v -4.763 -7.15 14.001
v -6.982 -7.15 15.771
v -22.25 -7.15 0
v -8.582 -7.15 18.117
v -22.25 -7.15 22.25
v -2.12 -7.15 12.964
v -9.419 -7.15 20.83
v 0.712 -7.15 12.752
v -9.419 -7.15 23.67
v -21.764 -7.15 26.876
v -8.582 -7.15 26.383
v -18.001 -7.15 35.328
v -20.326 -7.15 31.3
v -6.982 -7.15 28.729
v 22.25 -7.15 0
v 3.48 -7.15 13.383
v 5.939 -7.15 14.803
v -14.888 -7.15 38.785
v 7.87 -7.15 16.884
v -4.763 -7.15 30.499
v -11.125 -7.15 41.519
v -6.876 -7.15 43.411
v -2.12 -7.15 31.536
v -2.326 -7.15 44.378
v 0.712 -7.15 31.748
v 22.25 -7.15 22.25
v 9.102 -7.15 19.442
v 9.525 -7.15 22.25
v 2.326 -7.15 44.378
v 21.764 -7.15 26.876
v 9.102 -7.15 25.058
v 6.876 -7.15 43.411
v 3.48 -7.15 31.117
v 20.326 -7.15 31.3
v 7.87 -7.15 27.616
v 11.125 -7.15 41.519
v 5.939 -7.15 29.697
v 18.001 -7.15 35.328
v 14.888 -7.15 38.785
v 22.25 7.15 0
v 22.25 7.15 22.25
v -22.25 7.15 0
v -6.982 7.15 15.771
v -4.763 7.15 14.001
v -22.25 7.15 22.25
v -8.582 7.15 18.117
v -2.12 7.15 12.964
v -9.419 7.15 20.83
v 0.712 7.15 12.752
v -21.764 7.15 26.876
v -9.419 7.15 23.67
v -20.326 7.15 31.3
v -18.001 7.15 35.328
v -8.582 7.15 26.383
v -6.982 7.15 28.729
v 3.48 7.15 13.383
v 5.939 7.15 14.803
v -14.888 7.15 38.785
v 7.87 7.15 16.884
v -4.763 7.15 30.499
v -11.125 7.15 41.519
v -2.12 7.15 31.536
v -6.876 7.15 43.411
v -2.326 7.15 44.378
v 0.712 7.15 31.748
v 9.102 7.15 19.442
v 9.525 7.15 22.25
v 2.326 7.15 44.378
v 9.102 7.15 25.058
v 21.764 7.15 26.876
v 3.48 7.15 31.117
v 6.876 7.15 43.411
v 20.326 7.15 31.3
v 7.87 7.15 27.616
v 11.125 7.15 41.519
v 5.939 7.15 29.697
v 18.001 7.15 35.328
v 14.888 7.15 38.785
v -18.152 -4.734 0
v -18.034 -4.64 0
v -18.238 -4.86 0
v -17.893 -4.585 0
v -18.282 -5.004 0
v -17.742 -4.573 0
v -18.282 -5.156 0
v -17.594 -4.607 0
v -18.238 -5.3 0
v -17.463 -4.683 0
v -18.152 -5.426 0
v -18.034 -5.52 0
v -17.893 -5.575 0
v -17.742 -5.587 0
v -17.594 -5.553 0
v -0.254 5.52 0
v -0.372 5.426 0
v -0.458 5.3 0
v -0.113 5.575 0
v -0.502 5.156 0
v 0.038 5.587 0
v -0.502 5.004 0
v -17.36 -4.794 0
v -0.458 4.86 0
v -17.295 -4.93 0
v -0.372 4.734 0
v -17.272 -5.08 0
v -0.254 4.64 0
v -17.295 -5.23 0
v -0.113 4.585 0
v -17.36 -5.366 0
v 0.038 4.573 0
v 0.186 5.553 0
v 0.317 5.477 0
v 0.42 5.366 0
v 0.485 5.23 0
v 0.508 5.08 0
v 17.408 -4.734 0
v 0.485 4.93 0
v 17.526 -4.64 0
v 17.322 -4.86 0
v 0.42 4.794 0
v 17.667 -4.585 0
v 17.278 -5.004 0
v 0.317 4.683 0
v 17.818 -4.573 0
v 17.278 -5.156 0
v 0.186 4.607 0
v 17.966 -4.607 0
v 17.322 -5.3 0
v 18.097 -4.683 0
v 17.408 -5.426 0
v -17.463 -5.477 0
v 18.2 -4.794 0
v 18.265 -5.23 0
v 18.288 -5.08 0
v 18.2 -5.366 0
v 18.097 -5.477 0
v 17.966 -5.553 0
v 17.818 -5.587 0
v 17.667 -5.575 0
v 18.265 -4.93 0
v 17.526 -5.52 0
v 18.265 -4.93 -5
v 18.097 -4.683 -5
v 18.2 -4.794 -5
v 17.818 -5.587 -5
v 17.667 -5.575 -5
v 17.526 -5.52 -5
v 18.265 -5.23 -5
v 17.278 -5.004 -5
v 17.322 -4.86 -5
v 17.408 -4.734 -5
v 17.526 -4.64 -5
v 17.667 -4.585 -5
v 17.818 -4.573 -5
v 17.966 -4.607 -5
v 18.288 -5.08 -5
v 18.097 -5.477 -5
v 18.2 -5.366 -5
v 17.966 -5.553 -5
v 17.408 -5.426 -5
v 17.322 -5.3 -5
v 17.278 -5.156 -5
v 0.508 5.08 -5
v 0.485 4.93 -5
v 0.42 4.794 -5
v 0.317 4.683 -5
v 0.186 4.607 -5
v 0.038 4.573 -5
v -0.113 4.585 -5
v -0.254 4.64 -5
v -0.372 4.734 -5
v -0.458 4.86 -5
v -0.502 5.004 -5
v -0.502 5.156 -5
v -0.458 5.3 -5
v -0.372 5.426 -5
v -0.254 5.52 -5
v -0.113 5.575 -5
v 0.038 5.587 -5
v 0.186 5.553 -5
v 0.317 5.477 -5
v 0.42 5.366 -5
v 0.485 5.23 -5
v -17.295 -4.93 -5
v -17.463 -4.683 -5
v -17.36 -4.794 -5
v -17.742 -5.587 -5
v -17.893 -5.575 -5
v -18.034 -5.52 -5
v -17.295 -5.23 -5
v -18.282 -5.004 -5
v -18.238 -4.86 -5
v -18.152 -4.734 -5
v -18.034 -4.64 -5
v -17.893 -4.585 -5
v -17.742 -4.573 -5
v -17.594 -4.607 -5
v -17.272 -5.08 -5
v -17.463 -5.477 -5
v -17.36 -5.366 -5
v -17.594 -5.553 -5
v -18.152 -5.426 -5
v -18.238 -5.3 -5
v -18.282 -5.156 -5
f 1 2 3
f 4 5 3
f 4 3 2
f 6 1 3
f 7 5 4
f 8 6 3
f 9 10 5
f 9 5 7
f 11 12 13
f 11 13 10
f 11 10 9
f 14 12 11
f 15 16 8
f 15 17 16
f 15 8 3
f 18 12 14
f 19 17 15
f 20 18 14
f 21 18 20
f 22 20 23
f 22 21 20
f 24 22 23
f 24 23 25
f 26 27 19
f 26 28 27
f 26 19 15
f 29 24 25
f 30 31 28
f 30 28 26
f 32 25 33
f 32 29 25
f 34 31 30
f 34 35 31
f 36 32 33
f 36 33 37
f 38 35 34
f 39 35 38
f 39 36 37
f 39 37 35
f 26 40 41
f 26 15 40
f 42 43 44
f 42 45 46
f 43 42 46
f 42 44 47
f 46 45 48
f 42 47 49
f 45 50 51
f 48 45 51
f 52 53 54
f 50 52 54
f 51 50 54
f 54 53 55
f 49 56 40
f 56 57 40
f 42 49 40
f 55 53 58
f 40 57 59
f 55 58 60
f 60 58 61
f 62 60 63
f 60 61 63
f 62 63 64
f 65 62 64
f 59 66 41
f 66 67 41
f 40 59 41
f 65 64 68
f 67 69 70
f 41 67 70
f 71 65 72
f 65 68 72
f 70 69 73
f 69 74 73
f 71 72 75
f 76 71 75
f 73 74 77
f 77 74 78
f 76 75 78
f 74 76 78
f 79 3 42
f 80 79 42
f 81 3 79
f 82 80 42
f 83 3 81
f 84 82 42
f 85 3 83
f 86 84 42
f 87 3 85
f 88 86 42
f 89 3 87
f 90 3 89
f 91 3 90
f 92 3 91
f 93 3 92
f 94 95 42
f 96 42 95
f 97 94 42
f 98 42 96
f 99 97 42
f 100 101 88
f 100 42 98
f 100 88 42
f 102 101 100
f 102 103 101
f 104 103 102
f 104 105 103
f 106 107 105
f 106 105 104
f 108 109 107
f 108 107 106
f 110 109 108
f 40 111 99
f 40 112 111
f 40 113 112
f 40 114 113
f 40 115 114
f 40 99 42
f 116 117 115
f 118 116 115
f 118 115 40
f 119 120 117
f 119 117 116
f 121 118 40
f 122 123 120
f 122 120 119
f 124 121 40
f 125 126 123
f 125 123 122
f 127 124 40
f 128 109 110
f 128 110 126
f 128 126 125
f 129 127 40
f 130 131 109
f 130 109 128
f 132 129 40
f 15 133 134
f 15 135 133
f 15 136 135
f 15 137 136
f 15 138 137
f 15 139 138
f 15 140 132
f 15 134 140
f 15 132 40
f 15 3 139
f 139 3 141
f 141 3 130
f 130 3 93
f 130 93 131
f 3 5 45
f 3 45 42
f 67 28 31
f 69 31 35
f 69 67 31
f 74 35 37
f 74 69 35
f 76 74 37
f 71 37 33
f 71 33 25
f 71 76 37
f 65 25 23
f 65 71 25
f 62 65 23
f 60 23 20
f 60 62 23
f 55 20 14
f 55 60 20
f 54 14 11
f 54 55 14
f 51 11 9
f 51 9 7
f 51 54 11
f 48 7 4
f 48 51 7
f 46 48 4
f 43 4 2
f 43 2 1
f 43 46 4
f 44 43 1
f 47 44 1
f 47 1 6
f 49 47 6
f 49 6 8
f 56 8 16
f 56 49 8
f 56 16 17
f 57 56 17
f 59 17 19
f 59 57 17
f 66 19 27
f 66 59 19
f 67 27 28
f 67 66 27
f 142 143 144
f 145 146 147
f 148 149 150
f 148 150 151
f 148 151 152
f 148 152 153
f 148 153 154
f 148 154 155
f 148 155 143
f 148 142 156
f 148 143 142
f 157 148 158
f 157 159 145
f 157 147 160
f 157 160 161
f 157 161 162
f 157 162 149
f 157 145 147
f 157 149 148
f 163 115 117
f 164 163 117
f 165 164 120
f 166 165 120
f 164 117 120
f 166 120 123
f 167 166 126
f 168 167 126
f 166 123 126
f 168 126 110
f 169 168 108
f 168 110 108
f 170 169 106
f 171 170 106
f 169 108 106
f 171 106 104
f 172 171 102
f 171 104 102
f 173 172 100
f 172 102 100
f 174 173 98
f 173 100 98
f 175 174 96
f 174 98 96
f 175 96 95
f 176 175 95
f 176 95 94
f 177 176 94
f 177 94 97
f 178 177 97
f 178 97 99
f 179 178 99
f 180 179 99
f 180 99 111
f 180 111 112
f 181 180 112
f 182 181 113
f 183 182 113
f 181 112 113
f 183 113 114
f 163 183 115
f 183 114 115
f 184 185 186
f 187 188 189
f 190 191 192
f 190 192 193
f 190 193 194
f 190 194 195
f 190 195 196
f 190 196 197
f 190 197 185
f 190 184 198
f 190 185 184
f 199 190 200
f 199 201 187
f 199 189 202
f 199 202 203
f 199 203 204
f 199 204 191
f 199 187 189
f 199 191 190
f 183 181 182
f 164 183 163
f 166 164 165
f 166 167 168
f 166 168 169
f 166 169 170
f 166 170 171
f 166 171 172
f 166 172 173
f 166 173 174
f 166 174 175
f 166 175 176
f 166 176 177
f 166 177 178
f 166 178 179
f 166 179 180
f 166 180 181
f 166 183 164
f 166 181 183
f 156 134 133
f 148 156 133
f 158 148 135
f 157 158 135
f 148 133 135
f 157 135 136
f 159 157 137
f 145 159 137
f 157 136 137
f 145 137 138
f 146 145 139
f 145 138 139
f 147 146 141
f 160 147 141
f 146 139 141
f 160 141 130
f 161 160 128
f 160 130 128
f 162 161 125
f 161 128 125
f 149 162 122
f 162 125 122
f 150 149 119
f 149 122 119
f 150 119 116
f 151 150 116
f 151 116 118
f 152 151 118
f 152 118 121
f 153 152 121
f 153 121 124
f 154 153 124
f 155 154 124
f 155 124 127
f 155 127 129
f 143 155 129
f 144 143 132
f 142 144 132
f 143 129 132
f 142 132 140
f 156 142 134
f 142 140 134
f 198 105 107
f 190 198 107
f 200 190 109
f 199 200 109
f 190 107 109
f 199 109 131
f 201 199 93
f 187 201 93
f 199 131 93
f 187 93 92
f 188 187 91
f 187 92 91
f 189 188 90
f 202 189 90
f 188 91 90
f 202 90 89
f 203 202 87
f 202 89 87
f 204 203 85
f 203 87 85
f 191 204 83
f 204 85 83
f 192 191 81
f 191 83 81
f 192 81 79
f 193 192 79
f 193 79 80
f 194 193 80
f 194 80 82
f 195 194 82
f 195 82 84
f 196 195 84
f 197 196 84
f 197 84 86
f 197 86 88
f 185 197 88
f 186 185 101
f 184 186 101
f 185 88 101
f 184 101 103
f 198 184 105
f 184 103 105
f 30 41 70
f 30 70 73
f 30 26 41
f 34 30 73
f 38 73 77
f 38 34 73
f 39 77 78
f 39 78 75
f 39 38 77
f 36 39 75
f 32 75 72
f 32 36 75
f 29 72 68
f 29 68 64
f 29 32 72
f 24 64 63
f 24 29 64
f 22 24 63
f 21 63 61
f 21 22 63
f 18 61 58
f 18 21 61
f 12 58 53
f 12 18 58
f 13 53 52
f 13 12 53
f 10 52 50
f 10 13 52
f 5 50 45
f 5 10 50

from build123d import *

# Parameters (mm, degrees)
F0_R     = 9.525
F1_DEPTH = 7.15
F2_R     = 0.508
F3_DEPTH = 5


with BuildPart() as f1:
    # F0 (on Front) → F1 (new body, symmetric)
    with BuildSketch(Plane.XZ):
        with BuildLine():
            ThreePointArc((22.25, 22.25), (0, 44.5), (-22.25, 22.25))
            Line((-22.25, 22.25), (-22.25, 0))
            Line((-22.25, 0), (22.25, 0))
            Line((22.25, 0), (22.25, 22.25))
        make_face()
        with Locations((0, 22.25)):
            Circle(F0_R, mode=Mode.SUBTRACT)
    extrude(amount=F1_DEPTH, both=True)

    # F2 (on face) → F3 (join)
    with BuildSketch(Plane(origin=(0, 0, 0), x_dir=(1, 0, 0), z_dir=(0, 0, -1))):
        with Locations((-17.78, 5.08)):
            Circle(F2_R)
        with Locations((17.78, 5.08)):
            Circle(F2_R)
        with Locations((0, -5.08)):
            Circle(F2_R)
    extrude(amount=F3_DEPTH)


solid = f1.part
